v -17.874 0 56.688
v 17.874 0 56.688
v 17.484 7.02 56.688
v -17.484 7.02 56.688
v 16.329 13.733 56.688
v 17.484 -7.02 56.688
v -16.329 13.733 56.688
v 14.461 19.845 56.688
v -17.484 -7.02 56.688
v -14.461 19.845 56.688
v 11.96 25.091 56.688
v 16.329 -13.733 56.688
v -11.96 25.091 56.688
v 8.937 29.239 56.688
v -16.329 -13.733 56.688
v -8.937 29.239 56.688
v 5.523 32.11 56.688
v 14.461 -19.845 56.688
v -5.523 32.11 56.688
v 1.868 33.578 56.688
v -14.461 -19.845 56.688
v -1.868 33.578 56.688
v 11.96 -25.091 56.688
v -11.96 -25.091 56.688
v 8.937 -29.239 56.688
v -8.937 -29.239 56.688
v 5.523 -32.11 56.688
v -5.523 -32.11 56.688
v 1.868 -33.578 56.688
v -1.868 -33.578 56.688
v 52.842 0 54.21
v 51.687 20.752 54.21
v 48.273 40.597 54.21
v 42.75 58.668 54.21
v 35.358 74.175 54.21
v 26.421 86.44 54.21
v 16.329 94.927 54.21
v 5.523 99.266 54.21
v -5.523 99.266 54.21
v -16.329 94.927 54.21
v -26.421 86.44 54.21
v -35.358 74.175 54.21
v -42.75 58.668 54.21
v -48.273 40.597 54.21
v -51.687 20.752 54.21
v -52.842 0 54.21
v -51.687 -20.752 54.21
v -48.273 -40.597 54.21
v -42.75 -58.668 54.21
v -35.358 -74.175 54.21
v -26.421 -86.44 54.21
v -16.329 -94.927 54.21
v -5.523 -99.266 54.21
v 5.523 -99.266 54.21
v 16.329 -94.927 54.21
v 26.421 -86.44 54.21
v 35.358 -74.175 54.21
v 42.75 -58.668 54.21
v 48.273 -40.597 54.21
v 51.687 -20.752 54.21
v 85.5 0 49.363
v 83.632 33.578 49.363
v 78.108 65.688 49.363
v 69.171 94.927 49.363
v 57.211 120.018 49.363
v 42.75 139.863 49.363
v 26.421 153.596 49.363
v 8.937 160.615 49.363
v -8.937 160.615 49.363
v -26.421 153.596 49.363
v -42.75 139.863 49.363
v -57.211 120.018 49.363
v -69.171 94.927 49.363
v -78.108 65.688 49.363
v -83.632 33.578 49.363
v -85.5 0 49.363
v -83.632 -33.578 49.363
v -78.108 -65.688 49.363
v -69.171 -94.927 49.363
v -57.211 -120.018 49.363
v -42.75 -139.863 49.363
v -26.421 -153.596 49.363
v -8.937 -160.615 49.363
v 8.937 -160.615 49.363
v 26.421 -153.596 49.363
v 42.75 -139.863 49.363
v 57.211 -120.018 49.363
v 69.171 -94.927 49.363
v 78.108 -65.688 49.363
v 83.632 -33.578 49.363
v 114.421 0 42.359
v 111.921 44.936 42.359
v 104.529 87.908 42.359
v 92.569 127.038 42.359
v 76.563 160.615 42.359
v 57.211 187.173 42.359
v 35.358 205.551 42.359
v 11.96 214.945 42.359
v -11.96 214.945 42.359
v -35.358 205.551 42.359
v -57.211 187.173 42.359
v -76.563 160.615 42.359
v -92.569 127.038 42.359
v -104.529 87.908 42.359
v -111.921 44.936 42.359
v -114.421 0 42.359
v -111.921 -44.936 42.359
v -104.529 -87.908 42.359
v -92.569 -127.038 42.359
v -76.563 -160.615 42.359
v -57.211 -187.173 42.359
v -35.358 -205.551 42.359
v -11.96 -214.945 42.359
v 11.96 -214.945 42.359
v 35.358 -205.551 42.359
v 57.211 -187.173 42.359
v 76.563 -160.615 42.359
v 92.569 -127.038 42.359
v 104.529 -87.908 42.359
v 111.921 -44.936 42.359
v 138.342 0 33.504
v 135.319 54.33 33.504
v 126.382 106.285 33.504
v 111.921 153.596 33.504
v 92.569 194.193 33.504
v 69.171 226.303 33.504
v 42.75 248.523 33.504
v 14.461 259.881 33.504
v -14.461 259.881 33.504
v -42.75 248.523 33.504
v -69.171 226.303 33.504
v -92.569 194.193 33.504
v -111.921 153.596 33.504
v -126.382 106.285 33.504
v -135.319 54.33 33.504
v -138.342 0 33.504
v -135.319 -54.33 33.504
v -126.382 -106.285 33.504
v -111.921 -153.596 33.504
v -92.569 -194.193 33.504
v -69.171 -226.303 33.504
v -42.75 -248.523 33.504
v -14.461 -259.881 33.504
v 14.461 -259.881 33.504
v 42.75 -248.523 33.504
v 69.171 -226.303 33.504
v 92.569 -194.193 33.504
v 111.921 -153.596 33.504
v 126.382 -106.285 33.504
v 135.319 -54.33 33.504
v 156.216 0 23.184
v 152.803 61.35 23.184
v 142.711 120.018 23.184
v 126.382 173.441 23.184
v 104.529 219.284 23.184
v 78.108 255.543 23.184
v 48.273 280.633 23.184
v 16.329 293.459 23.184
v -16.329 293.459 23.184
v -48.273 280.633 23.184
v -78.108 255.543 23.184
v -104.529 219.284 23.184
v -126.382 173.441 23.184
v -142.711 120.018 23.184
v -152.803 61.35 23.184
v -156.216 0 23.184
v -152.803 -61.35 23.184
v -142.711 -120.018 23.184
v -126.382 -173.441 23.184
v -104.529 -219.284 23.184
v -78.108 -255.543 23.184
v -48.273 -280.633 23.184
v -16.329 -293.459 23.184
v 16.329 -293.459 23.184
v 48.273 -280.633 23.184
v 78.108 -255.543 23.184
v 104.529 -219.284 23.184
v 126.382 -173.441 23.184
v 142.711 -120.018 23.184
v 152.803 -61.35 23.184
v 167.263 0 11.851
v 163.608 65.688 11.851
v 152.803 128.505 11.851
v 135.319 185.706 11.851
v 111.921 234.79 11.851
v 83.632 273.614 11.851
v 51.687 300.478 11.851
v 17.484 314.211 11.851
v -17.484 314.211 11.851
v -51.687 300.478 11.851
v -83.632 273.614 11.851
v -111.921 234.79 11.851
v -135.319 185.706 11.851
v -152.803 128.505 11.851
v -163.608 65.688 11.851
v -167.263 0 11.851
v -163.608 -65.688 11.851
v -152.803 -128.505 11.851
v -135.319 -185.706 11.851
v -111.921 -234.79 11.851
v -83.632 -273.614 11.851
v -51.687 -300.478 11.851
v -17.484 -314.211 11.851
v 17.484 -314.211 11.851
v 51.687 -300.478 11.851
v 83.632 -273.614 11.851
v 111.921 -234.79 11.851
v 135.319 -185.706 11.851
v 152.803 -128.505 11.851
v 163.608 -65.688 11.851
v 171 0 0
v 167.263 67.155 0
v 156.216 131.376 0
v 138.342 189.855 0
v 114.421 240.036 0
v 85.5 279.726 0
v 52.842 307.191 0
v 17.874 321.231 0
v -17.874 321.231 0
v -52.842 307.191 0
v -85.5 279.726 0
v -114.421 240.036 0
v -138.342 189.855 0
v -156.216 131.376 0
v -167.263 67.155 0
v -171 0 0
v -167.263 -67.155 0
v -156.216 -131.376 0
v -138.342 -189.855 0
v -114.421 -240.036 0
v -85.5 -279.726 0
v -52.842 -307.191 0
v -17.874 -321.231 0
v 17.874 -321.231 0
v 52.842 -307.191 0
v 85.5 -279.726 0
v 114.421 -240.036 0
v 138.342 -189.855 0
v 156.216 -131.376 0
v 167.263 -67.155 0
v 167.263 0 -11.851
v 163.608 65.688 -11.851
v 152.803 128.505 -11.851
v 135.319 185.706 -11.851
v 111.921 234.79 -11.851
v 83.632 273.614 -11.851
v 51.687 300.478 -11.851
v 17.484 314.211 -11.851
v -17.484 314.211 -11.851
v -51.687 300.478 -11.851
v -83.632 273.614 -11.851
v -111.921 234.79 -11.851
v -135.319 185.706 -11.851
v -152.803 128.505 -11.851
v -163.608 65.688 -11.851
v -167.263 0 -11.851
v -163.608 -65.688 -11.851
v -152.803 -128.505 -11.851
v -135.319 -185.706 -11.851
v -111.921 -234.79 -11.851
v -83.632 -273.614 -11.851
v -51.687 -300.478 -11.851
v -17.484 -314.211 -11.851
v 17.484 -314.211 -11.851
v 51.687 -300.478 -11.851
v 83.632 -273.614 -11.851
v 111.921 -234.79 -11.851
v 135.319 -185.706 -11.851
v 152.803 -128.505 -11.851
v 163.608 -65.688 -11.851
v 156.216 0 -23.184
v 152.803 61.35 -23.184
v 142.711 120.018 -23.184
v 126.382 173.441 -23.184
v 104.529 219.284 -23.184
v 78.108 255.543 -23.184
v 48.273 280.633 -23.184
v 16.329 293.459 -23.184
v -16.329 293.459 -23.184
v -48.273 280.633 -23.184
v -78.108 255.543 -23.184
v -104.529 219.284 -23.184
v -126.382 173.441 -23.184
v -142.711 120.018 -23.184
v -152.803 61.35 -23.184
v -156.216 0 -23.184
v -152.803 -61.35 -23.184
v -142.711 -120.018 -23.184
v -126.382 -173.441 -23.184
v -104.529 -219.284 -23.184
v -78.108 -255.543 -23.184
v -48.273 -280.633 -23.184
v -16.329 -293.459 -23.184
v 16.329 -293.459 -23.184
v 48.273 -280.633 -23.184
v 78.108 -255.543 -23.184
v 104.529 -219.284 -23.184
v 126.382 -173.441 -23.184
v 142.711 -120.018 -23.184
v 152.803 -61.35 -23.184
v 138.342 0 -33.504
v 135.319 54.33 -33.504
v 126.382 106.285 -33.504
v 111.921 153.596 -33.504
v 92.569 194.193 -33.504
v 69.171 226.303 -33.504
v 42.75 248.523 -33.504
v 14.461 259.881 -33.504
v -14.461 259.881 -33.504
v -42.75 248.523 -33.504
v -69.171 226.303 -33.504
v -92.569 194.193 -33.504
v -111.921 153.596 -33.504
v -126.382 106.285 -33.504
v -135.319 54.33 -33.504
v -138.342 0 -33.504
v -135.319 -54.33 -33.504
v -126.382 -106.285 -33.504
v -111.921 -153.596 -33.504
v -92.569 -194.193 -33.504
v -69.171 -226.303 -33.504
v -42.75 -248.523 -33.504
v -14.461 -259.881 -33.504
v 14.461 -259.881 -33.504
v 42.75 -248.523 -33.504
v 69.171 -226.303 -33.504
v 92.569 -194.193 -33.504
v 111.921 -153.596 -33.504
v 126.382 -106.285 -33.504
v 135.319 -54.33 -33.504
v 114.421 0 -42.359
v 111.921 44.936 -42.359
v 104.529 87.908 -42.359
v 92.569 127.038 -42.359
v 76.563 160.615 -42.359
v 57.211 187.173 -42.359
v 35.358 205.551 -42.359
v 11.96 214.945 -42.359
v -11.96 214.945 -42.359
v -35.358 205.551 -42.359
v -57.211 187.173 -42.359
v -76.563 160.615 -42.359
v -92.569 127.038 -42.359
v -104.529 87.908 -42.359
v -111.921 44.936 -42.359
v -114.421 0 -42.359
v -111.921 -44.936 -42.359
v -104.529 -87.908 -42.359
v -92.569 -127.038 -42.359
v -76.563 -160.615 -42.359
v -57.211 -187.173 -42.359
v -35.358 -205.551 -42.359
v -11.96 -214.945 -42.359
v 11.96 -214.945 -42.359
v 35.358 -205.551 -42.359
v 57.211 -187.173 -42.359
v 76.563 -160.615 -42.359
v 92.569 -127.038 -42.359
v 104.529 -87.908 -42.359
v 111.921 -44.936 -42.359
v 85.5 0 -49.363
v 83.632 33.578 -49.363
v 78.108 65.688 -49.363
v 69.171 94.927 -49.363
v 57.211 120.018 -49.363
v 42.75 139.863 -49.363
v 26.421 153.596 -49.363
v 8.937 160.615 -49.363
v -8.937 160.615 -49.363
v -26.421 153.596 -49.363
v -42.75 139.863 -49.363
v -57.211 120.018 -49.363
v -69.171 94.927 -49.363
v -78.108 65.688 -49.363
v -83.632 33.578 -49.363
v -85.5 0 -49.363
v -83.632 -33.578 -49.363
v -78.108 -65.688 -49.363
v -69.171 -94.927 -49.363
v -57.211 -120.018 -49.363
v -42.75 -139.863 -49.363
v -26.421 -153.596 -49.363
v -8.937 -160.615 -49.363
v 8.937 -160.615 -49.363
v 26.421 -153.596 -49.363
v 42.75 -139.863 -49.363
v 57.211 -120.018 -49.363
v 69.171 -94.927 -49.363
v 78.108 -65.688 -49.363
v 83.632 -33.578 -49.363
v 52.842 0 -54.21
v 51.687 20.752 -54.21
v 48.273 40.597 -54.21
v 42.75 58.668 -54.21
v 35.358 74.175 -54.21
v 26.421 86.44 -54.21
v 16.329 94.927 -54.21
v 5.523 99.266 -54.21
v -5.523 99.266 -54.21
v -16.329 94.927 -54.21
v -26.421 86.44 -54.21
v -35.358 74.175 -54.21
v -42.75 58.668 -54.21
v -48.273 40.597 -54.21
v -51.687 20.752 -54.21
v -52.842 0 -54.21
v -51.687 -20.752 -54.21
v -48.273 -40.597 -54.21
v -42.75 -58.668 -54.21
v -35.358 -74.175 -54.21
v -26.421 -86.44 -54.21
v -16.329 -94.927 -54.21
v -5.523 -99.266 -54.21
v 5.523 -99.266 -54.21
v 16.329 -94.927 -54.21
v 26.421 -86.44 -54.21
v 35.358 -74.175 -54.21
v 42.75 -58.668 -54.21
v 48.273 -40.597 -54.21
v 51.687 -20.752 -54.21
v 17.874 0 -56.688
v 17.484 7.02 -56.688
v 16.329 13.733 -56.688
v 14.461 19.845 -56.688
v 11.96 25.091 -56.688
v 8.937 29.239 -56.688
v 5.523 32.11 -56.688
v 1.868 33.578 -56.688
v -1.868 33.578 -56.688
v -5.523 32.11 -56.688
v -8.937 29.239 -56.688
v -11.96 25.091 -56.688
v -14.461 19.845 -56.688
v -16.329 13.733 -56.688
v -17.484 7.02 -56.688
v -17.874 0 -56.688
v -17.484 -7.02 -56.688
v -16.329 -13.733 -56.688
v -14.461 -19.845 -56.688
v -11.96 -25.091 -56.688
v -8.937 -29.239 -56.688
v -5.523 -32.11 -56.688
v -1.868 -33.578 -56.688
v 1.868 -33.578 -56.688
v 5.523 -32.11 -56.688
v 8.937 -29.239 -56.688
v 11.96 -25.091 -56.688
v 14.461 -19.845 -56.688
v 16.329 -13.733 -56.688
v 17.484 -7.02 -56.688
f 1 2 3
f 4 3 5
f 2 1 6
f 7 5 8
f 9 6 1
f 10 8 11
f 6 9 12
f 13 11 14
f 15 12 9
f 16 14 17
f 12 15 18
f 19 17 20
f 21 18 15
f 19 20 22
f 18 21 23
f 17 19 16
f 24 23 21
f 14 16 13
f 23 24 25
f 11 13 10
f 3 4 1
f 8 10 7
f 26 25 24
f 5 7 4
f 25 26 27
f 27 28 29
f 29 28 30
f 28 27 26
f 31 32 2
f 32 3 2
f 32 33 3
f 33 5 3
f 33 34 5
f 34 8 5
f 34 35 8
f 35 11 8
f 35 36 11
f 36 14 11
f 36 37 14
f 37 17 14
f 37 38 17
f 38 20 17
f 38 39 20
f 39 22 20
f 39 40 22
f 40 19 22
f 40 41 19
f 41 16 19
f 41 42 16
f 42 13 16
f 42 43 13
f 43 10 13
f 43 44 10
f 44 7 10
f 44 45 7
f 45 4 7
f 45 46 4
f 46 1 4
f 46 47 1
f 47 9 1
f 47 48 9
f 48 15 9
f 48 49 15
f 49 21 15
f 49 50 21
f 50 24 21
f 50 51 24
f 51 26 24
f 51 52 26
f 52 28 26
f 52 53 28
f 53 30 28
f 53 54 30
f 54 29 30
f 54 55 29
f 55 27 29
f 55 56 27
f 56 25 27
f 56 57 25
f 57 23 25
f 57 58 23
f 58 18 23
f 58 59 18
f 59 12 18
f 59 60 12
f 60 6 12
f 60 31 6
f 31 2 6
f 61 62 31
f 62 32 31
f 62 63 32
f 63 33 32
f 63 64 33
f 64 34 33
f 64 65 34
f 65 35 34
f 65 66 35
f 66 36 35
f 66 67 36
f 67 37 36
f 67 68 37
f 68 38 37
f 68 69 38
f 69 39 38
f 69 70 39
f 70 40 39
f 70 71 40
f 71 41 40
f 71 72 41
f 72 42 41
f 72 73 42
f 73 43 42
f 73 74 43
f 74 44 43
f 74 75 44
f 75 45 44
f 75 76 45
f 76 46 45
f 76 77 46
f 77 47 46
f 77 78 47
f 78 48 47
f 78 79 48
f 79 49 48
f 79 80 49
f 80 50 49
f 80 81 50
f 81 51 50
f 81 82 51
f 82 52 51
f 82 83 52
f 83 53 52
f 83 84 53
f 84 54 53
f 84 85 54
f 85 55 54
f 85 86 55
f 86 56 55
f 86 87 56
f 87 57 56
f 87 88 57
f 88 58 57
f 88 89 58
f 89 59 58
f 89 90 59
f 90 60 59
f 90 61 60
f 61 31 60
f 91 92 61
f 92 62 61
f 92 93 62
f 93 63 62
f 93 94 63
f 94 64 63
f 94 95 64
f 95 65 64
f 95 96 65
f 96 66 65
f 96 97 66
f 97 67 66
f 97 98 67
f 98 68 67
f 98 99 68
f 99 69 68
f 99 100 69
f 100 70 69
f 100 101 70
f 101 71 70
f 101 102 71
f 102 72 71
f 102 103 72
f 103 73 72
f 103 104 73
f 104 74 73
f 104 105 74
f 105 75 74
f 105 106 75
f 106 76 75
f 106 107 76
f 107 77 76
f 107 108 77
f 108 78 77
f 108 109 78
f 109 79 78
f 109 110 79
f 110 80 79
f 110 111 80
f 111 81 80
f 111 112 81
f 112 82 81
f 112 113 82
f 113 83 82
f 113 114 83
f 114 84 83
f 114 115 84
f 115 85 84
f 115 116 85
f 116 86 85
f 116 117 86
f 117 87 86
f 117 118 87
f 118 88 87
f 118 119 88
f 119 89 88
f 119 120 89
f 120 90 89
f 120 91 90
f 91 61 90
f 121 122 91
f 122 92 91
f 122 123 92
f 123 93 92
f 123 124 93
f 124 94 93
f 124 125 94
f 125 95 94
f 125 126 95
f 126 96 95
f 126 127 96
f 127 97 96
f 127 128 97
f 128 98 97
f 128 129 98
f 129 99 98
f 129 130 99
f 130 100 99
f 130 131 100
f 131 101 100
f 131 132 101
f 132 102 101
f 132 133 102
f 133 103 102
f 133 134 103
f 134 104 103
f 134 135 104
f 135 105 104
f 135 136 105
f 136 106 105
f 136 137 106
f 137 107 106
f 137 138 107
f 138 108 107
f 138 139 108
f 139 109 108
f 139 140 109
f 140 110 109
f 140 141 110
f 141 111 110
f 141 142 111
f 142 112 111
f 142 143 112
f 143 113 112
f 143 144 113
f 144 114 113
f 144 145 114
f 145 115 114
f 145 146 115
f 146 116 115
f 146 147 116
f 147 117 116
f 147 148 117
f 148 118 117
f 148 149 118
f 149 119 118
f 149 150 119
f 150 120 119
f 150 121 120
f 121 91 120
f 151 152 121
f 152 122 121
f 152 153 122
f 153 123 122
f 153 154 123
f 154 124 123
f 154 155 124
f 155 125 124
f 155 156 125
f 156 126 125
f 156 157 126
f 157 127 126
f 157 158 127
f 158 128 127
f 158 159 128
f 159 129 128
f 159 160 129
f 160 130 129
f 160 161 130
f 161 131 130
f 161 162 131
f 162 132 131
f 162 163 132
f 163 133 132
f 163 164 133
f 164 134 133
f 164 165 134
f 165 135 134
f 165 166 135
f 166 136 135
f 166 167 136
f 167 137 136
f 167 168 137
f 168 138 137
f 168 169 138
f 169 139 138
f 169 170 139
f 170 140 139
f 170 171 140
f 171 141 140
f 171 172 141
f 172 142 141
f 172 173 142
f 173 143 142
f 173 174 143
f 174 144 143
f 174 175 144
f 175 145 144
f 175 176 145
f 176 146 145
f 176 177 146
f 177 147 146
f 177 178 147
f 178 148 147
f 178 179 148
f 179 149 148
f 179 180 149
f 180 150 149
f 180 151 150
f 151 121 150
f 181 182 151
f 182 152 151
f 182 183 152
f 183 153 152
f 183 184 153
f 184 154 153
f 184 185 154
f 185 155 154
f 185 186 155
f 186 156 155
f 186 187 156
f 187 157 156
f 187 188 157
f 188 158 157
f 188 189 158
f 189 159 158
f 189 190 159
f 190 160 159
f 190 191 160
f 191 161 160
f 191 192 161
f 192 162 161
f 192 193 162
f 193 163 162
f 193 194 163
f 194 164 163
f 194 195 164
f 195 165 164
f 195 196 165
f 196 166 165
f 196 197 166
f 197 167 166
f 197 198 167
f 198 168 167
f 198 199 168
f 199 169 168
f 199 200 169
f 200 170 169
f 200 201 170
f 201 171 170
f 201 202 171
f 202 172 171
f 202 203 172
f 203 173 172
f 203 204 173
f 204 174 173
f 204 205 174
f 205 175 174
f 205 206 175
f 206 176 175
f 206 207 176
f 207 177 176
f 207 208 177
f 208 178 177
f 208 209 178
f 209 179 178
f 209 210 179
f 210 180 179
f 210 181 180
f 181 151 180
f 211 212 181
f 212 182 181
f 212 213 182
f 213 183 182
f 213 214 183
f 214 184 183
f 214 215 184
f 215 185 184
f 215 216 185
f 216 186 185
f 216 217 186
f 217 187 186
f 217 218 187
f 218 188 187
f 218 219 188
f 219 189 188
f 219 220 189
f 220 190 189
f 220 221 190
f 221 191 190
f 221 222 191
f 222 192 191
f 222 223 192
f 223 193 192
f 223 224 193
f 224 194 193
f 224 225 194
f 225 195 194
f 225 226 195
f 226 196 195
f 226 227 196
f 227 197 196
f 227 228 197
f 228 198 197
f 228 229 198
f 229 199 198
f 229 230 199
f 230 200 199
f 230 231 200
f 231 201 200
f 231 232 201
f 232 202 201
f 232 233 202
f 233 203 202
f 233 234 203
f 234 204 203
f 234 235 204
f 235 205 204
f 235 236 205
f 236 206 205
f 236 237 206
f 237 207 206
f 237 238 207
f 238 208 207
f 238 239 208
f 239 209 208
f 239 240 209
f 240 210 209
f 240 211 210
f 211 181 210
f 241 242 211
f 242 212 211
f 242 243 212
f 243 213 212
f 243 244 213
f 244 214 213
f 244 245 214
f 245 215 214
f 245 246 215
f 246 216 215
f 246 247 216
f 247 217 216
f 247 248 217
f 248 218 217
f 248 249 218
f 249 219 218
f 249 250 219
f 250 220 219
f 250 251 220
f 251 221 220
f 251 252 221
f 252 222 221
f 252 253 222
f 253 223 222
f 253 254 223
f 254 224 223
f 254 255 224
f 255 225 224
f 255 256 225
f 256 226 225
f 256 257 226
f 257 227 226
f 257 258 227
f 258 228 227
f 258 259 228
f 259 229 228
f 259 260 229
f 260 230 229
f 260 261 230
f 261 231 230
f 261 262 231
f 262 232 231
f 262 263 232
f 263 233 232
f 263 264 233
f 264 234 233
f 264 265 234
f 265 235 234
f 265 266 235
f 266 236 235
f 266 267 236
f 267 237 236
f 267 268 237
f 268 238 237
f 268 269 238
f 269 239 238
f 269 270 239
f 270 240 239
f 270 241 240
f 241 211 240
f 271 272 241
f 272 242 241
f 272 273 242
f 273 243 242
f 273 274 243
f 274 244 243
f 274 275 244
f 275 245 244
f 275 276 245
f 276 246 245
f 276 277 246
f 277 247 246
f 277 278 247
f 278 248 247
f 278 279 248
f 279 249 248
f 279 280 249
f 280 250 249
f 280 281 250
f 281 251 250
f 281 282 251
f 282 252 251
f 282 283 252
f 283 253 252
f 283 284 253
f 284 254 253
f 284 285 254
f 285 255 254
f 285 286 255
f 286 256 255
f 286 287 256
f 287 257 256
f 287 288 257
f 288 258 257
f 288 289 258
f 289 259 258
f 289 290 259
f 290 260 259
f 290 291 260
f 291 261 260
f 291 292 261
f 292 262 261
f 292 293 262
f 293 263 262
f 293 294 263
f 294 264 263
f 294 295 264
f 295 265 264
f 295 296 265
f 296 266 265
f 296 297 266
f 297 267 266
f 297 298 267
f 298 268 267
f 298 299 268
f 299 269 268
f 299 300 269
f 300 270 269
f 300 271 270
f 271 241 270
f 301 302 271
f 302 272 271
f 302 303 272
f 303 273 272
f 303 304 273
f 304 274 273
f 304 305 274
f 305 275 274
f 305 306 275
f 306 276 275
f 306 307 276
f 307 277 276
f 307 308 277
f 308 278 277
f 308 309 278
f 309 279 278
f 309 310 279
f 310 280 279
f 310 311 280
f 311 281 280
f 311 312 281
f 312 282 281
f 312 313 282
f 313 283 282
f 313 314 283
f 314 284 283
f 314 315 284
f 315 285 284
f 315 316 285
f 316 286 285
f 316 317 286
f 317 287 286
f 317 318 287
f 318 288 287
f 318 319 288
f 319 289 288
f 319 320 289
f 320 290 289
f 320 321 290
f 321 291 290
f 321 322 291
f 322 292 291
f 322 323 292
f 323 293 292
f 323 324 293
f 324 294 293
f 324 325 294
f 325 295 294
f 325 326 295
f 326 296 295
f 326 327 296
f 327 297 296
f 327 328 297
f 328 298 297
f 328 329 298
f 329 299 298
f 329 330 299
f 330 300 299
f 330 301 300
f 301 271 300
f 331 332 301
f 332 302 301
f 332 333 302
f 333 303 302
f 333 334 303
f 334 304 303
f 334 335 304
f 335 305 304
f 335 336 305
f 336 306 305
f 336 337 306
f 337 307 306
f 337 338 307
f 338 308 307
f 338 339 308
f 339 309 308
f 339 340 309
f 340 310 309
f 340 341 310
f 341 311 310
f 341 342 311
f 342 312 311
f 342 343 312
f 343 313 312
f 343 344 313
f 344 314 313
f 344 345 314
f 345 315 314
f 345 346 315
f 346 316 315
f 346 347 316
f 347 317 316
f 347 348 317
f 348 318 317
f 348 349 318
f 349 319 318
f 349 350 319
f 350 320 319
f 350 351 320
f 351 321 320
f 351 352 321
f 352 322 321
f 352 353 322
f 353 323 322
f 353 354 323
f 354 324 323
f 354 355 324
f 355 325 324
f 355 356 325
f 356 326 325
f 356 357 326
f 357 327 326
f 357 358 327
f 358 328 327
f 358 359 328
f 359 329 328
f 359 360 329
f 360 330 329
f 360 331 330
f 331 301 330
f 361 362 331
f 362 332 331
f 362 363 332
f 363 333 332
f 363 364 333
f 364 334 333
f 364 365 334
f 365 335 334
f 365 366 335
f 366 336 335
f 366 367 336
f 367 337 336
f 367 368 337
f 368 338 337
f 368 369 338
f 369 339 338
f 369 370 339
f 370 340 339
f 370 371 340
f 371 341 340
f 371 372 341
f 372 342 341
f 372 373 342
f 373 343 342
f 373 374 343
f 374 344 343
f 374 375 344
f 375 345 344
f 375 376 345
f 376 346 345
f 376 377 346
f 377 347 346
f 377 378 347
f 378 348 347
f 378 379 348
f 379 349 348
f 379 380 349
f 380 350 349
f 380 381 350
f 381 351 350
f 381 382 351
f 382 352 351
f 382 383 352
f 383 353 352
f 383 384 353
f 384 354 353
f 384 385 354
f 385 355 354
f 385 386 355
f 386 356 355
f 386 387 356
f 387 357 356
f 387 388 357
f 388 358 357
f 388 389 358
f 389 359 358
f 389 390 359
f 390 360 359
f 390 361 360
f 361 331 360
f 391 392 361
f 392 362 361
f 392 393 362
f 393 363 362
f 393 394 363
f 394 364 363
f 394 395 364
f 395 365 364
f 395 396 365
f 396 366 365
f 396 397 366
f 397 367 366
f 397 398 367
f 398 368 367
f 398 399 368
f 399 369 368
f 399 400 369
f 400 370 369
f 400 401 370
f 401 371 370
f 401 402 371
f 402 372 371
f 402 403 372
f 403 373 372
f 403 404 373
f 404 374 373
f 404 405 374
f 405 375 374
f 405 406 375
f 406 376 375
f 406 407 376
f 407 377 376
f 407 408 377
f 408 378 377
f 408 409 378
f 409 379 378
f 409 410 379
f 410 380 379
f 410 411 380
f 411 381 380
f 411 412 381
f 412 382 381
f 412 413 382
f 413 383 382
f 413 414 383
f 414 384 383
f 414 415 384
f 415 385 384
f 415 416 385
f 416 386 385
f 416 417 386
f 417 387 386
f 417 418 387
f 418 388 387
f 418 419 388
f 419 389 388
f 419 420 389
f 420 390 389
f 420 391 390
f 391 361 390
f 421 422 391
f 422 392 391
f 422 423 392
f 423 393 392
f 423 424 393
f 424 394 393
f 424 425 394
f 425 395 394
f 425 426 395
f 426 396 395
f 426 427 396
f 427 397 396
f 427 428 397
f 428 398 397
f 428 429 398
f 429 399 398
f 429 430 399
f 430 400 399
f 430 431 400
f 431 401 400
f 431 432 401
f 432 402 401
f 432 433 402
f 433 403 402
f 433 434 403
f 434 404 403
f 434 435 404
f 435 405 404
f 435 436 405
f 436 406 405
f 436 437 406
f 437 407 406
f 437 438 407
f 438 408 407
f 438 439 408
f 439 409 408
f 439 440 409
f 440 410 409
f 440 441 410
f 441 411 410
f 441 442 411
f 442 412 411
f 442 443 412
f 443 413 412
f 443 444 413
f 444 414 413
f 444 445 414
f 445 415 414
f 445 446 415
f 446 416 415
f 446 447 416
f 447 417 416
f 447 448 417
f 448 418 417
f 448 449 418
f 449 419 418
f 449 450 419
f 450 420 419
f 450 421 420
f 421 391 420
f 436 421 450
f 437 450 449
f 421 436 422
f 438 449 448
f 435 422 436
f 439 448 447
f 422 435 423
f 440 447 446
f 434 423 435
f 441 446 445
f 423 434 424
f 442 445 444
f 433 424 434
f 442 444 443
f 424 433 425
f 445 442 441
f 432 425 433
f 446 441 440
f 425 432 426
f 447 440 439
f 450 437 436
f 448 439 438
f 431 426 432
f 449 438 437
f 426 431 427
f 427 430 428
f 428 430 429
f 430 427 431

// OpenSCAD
// Generated by SolidPython 1.0.1 on 2020-07-29 00:46:49


scale(v = [9, 17, 3]) {
	sphere(r = 19);
}
/***********************************************
*********      SolidPython code:      **********
************************************************
 
# import packages: SolidPython
from solid import *
from solid.utils import *
from itertools import chain, combinations, permutations


class Resize:

    def __init__(self, scad_file):
        self.scad_file = scad_file
        #self.scad_file = import_scad(scad_file)
        # cone/cylinder param:
        self.r1 = 0
        self.r2 = 0
        self.h = 0
        # rectangular prism param:
        self.w = 0
        self.l = 0
        # ellipse param:
        self.r = 0

    # import OpenScad code (file name corresponds to shape)


    # classify shape + parameters
    def assign(self, param1, param2, param3):
        if self.scad_file == 'cone.scad':
            self.r1 = param1
            self.r2 = param2
            self.h = param3
        elif self.scad_file == 'cylinder.scad':
            self.r1 = param1
            self.r2 = param2
            self.h = param3
        elif self.scad_file == 'rectangularPrism.scad':
            self.h = param1
            self.l = param2
            self.w = param3
        else:
            self.r = param1
            self.h = param2

    # resize parameters
    def iterate(self):
        x = range(3, 20, 2)
        i = 1
        if self.scad_file == 'cone.scad':
            tempList = list(permutations(x, 2))
            for temp in tempList:
                param1 = temp[0]
                param2 = temp[1]
                filepath = 'produced_scad_files/' + 'cone' + str(param1) + '_' + str(param2) + '_' + '.scad'
                scad_render_to_file(cylinder(h=param1, r1=param2, r2=0), filepath)

        elif self.scad_file == 'cylinder.scad':
            tempList = list(permutations(x, 3))
            for temp in tempList:
                param1 = temp[0]
                param2 = temp[1]
                filepath = 'produced_scad_files/' + 'cylinder' + str(param1) + '_' + str(param2) + '_' + '.scad'
                scad_render_to_file(cylinder(h=param1, r1=param2, r2=param2), filepath)

        elif self.scad_file == 'rectangularPrism.scad':
            tempList = list(permutations(x, 3))
            for temp in tempList:
                param1 = temp[0]
                param2 = temp[1]
                param3 = temp[2]
                filepath = 'produced_scad_files/' + 'rectangularPrism' + str(param1) + '_' + str(param2) + '_' + str(
                    param3) + '.scad'
                scad_render_to_file(cube(size=(param1, param2, param3)), filepath)

        elif self.scad_file == 'ellipse.scad':
            tempList = list(permutations(x, 4))
            for temp in tempList:
                param1 = temp[0]
                param2 = temp[1]
                param3 = temp[2]
                param4 = temp[3]
                filepath = 'produced_scad_files/' + 'ellipse' + str(param1) + '_' + str(param2) + '_' + str(param3) + '_' + str(param4) + '.scad'
                scad_render_to_file(scale([param1, param2, param3])(sphere(r=param4)), filepath)

    def render_to_scadfile(self):
        scad_render_to_file(scad, 'example.scad') 
 
************************************************/
